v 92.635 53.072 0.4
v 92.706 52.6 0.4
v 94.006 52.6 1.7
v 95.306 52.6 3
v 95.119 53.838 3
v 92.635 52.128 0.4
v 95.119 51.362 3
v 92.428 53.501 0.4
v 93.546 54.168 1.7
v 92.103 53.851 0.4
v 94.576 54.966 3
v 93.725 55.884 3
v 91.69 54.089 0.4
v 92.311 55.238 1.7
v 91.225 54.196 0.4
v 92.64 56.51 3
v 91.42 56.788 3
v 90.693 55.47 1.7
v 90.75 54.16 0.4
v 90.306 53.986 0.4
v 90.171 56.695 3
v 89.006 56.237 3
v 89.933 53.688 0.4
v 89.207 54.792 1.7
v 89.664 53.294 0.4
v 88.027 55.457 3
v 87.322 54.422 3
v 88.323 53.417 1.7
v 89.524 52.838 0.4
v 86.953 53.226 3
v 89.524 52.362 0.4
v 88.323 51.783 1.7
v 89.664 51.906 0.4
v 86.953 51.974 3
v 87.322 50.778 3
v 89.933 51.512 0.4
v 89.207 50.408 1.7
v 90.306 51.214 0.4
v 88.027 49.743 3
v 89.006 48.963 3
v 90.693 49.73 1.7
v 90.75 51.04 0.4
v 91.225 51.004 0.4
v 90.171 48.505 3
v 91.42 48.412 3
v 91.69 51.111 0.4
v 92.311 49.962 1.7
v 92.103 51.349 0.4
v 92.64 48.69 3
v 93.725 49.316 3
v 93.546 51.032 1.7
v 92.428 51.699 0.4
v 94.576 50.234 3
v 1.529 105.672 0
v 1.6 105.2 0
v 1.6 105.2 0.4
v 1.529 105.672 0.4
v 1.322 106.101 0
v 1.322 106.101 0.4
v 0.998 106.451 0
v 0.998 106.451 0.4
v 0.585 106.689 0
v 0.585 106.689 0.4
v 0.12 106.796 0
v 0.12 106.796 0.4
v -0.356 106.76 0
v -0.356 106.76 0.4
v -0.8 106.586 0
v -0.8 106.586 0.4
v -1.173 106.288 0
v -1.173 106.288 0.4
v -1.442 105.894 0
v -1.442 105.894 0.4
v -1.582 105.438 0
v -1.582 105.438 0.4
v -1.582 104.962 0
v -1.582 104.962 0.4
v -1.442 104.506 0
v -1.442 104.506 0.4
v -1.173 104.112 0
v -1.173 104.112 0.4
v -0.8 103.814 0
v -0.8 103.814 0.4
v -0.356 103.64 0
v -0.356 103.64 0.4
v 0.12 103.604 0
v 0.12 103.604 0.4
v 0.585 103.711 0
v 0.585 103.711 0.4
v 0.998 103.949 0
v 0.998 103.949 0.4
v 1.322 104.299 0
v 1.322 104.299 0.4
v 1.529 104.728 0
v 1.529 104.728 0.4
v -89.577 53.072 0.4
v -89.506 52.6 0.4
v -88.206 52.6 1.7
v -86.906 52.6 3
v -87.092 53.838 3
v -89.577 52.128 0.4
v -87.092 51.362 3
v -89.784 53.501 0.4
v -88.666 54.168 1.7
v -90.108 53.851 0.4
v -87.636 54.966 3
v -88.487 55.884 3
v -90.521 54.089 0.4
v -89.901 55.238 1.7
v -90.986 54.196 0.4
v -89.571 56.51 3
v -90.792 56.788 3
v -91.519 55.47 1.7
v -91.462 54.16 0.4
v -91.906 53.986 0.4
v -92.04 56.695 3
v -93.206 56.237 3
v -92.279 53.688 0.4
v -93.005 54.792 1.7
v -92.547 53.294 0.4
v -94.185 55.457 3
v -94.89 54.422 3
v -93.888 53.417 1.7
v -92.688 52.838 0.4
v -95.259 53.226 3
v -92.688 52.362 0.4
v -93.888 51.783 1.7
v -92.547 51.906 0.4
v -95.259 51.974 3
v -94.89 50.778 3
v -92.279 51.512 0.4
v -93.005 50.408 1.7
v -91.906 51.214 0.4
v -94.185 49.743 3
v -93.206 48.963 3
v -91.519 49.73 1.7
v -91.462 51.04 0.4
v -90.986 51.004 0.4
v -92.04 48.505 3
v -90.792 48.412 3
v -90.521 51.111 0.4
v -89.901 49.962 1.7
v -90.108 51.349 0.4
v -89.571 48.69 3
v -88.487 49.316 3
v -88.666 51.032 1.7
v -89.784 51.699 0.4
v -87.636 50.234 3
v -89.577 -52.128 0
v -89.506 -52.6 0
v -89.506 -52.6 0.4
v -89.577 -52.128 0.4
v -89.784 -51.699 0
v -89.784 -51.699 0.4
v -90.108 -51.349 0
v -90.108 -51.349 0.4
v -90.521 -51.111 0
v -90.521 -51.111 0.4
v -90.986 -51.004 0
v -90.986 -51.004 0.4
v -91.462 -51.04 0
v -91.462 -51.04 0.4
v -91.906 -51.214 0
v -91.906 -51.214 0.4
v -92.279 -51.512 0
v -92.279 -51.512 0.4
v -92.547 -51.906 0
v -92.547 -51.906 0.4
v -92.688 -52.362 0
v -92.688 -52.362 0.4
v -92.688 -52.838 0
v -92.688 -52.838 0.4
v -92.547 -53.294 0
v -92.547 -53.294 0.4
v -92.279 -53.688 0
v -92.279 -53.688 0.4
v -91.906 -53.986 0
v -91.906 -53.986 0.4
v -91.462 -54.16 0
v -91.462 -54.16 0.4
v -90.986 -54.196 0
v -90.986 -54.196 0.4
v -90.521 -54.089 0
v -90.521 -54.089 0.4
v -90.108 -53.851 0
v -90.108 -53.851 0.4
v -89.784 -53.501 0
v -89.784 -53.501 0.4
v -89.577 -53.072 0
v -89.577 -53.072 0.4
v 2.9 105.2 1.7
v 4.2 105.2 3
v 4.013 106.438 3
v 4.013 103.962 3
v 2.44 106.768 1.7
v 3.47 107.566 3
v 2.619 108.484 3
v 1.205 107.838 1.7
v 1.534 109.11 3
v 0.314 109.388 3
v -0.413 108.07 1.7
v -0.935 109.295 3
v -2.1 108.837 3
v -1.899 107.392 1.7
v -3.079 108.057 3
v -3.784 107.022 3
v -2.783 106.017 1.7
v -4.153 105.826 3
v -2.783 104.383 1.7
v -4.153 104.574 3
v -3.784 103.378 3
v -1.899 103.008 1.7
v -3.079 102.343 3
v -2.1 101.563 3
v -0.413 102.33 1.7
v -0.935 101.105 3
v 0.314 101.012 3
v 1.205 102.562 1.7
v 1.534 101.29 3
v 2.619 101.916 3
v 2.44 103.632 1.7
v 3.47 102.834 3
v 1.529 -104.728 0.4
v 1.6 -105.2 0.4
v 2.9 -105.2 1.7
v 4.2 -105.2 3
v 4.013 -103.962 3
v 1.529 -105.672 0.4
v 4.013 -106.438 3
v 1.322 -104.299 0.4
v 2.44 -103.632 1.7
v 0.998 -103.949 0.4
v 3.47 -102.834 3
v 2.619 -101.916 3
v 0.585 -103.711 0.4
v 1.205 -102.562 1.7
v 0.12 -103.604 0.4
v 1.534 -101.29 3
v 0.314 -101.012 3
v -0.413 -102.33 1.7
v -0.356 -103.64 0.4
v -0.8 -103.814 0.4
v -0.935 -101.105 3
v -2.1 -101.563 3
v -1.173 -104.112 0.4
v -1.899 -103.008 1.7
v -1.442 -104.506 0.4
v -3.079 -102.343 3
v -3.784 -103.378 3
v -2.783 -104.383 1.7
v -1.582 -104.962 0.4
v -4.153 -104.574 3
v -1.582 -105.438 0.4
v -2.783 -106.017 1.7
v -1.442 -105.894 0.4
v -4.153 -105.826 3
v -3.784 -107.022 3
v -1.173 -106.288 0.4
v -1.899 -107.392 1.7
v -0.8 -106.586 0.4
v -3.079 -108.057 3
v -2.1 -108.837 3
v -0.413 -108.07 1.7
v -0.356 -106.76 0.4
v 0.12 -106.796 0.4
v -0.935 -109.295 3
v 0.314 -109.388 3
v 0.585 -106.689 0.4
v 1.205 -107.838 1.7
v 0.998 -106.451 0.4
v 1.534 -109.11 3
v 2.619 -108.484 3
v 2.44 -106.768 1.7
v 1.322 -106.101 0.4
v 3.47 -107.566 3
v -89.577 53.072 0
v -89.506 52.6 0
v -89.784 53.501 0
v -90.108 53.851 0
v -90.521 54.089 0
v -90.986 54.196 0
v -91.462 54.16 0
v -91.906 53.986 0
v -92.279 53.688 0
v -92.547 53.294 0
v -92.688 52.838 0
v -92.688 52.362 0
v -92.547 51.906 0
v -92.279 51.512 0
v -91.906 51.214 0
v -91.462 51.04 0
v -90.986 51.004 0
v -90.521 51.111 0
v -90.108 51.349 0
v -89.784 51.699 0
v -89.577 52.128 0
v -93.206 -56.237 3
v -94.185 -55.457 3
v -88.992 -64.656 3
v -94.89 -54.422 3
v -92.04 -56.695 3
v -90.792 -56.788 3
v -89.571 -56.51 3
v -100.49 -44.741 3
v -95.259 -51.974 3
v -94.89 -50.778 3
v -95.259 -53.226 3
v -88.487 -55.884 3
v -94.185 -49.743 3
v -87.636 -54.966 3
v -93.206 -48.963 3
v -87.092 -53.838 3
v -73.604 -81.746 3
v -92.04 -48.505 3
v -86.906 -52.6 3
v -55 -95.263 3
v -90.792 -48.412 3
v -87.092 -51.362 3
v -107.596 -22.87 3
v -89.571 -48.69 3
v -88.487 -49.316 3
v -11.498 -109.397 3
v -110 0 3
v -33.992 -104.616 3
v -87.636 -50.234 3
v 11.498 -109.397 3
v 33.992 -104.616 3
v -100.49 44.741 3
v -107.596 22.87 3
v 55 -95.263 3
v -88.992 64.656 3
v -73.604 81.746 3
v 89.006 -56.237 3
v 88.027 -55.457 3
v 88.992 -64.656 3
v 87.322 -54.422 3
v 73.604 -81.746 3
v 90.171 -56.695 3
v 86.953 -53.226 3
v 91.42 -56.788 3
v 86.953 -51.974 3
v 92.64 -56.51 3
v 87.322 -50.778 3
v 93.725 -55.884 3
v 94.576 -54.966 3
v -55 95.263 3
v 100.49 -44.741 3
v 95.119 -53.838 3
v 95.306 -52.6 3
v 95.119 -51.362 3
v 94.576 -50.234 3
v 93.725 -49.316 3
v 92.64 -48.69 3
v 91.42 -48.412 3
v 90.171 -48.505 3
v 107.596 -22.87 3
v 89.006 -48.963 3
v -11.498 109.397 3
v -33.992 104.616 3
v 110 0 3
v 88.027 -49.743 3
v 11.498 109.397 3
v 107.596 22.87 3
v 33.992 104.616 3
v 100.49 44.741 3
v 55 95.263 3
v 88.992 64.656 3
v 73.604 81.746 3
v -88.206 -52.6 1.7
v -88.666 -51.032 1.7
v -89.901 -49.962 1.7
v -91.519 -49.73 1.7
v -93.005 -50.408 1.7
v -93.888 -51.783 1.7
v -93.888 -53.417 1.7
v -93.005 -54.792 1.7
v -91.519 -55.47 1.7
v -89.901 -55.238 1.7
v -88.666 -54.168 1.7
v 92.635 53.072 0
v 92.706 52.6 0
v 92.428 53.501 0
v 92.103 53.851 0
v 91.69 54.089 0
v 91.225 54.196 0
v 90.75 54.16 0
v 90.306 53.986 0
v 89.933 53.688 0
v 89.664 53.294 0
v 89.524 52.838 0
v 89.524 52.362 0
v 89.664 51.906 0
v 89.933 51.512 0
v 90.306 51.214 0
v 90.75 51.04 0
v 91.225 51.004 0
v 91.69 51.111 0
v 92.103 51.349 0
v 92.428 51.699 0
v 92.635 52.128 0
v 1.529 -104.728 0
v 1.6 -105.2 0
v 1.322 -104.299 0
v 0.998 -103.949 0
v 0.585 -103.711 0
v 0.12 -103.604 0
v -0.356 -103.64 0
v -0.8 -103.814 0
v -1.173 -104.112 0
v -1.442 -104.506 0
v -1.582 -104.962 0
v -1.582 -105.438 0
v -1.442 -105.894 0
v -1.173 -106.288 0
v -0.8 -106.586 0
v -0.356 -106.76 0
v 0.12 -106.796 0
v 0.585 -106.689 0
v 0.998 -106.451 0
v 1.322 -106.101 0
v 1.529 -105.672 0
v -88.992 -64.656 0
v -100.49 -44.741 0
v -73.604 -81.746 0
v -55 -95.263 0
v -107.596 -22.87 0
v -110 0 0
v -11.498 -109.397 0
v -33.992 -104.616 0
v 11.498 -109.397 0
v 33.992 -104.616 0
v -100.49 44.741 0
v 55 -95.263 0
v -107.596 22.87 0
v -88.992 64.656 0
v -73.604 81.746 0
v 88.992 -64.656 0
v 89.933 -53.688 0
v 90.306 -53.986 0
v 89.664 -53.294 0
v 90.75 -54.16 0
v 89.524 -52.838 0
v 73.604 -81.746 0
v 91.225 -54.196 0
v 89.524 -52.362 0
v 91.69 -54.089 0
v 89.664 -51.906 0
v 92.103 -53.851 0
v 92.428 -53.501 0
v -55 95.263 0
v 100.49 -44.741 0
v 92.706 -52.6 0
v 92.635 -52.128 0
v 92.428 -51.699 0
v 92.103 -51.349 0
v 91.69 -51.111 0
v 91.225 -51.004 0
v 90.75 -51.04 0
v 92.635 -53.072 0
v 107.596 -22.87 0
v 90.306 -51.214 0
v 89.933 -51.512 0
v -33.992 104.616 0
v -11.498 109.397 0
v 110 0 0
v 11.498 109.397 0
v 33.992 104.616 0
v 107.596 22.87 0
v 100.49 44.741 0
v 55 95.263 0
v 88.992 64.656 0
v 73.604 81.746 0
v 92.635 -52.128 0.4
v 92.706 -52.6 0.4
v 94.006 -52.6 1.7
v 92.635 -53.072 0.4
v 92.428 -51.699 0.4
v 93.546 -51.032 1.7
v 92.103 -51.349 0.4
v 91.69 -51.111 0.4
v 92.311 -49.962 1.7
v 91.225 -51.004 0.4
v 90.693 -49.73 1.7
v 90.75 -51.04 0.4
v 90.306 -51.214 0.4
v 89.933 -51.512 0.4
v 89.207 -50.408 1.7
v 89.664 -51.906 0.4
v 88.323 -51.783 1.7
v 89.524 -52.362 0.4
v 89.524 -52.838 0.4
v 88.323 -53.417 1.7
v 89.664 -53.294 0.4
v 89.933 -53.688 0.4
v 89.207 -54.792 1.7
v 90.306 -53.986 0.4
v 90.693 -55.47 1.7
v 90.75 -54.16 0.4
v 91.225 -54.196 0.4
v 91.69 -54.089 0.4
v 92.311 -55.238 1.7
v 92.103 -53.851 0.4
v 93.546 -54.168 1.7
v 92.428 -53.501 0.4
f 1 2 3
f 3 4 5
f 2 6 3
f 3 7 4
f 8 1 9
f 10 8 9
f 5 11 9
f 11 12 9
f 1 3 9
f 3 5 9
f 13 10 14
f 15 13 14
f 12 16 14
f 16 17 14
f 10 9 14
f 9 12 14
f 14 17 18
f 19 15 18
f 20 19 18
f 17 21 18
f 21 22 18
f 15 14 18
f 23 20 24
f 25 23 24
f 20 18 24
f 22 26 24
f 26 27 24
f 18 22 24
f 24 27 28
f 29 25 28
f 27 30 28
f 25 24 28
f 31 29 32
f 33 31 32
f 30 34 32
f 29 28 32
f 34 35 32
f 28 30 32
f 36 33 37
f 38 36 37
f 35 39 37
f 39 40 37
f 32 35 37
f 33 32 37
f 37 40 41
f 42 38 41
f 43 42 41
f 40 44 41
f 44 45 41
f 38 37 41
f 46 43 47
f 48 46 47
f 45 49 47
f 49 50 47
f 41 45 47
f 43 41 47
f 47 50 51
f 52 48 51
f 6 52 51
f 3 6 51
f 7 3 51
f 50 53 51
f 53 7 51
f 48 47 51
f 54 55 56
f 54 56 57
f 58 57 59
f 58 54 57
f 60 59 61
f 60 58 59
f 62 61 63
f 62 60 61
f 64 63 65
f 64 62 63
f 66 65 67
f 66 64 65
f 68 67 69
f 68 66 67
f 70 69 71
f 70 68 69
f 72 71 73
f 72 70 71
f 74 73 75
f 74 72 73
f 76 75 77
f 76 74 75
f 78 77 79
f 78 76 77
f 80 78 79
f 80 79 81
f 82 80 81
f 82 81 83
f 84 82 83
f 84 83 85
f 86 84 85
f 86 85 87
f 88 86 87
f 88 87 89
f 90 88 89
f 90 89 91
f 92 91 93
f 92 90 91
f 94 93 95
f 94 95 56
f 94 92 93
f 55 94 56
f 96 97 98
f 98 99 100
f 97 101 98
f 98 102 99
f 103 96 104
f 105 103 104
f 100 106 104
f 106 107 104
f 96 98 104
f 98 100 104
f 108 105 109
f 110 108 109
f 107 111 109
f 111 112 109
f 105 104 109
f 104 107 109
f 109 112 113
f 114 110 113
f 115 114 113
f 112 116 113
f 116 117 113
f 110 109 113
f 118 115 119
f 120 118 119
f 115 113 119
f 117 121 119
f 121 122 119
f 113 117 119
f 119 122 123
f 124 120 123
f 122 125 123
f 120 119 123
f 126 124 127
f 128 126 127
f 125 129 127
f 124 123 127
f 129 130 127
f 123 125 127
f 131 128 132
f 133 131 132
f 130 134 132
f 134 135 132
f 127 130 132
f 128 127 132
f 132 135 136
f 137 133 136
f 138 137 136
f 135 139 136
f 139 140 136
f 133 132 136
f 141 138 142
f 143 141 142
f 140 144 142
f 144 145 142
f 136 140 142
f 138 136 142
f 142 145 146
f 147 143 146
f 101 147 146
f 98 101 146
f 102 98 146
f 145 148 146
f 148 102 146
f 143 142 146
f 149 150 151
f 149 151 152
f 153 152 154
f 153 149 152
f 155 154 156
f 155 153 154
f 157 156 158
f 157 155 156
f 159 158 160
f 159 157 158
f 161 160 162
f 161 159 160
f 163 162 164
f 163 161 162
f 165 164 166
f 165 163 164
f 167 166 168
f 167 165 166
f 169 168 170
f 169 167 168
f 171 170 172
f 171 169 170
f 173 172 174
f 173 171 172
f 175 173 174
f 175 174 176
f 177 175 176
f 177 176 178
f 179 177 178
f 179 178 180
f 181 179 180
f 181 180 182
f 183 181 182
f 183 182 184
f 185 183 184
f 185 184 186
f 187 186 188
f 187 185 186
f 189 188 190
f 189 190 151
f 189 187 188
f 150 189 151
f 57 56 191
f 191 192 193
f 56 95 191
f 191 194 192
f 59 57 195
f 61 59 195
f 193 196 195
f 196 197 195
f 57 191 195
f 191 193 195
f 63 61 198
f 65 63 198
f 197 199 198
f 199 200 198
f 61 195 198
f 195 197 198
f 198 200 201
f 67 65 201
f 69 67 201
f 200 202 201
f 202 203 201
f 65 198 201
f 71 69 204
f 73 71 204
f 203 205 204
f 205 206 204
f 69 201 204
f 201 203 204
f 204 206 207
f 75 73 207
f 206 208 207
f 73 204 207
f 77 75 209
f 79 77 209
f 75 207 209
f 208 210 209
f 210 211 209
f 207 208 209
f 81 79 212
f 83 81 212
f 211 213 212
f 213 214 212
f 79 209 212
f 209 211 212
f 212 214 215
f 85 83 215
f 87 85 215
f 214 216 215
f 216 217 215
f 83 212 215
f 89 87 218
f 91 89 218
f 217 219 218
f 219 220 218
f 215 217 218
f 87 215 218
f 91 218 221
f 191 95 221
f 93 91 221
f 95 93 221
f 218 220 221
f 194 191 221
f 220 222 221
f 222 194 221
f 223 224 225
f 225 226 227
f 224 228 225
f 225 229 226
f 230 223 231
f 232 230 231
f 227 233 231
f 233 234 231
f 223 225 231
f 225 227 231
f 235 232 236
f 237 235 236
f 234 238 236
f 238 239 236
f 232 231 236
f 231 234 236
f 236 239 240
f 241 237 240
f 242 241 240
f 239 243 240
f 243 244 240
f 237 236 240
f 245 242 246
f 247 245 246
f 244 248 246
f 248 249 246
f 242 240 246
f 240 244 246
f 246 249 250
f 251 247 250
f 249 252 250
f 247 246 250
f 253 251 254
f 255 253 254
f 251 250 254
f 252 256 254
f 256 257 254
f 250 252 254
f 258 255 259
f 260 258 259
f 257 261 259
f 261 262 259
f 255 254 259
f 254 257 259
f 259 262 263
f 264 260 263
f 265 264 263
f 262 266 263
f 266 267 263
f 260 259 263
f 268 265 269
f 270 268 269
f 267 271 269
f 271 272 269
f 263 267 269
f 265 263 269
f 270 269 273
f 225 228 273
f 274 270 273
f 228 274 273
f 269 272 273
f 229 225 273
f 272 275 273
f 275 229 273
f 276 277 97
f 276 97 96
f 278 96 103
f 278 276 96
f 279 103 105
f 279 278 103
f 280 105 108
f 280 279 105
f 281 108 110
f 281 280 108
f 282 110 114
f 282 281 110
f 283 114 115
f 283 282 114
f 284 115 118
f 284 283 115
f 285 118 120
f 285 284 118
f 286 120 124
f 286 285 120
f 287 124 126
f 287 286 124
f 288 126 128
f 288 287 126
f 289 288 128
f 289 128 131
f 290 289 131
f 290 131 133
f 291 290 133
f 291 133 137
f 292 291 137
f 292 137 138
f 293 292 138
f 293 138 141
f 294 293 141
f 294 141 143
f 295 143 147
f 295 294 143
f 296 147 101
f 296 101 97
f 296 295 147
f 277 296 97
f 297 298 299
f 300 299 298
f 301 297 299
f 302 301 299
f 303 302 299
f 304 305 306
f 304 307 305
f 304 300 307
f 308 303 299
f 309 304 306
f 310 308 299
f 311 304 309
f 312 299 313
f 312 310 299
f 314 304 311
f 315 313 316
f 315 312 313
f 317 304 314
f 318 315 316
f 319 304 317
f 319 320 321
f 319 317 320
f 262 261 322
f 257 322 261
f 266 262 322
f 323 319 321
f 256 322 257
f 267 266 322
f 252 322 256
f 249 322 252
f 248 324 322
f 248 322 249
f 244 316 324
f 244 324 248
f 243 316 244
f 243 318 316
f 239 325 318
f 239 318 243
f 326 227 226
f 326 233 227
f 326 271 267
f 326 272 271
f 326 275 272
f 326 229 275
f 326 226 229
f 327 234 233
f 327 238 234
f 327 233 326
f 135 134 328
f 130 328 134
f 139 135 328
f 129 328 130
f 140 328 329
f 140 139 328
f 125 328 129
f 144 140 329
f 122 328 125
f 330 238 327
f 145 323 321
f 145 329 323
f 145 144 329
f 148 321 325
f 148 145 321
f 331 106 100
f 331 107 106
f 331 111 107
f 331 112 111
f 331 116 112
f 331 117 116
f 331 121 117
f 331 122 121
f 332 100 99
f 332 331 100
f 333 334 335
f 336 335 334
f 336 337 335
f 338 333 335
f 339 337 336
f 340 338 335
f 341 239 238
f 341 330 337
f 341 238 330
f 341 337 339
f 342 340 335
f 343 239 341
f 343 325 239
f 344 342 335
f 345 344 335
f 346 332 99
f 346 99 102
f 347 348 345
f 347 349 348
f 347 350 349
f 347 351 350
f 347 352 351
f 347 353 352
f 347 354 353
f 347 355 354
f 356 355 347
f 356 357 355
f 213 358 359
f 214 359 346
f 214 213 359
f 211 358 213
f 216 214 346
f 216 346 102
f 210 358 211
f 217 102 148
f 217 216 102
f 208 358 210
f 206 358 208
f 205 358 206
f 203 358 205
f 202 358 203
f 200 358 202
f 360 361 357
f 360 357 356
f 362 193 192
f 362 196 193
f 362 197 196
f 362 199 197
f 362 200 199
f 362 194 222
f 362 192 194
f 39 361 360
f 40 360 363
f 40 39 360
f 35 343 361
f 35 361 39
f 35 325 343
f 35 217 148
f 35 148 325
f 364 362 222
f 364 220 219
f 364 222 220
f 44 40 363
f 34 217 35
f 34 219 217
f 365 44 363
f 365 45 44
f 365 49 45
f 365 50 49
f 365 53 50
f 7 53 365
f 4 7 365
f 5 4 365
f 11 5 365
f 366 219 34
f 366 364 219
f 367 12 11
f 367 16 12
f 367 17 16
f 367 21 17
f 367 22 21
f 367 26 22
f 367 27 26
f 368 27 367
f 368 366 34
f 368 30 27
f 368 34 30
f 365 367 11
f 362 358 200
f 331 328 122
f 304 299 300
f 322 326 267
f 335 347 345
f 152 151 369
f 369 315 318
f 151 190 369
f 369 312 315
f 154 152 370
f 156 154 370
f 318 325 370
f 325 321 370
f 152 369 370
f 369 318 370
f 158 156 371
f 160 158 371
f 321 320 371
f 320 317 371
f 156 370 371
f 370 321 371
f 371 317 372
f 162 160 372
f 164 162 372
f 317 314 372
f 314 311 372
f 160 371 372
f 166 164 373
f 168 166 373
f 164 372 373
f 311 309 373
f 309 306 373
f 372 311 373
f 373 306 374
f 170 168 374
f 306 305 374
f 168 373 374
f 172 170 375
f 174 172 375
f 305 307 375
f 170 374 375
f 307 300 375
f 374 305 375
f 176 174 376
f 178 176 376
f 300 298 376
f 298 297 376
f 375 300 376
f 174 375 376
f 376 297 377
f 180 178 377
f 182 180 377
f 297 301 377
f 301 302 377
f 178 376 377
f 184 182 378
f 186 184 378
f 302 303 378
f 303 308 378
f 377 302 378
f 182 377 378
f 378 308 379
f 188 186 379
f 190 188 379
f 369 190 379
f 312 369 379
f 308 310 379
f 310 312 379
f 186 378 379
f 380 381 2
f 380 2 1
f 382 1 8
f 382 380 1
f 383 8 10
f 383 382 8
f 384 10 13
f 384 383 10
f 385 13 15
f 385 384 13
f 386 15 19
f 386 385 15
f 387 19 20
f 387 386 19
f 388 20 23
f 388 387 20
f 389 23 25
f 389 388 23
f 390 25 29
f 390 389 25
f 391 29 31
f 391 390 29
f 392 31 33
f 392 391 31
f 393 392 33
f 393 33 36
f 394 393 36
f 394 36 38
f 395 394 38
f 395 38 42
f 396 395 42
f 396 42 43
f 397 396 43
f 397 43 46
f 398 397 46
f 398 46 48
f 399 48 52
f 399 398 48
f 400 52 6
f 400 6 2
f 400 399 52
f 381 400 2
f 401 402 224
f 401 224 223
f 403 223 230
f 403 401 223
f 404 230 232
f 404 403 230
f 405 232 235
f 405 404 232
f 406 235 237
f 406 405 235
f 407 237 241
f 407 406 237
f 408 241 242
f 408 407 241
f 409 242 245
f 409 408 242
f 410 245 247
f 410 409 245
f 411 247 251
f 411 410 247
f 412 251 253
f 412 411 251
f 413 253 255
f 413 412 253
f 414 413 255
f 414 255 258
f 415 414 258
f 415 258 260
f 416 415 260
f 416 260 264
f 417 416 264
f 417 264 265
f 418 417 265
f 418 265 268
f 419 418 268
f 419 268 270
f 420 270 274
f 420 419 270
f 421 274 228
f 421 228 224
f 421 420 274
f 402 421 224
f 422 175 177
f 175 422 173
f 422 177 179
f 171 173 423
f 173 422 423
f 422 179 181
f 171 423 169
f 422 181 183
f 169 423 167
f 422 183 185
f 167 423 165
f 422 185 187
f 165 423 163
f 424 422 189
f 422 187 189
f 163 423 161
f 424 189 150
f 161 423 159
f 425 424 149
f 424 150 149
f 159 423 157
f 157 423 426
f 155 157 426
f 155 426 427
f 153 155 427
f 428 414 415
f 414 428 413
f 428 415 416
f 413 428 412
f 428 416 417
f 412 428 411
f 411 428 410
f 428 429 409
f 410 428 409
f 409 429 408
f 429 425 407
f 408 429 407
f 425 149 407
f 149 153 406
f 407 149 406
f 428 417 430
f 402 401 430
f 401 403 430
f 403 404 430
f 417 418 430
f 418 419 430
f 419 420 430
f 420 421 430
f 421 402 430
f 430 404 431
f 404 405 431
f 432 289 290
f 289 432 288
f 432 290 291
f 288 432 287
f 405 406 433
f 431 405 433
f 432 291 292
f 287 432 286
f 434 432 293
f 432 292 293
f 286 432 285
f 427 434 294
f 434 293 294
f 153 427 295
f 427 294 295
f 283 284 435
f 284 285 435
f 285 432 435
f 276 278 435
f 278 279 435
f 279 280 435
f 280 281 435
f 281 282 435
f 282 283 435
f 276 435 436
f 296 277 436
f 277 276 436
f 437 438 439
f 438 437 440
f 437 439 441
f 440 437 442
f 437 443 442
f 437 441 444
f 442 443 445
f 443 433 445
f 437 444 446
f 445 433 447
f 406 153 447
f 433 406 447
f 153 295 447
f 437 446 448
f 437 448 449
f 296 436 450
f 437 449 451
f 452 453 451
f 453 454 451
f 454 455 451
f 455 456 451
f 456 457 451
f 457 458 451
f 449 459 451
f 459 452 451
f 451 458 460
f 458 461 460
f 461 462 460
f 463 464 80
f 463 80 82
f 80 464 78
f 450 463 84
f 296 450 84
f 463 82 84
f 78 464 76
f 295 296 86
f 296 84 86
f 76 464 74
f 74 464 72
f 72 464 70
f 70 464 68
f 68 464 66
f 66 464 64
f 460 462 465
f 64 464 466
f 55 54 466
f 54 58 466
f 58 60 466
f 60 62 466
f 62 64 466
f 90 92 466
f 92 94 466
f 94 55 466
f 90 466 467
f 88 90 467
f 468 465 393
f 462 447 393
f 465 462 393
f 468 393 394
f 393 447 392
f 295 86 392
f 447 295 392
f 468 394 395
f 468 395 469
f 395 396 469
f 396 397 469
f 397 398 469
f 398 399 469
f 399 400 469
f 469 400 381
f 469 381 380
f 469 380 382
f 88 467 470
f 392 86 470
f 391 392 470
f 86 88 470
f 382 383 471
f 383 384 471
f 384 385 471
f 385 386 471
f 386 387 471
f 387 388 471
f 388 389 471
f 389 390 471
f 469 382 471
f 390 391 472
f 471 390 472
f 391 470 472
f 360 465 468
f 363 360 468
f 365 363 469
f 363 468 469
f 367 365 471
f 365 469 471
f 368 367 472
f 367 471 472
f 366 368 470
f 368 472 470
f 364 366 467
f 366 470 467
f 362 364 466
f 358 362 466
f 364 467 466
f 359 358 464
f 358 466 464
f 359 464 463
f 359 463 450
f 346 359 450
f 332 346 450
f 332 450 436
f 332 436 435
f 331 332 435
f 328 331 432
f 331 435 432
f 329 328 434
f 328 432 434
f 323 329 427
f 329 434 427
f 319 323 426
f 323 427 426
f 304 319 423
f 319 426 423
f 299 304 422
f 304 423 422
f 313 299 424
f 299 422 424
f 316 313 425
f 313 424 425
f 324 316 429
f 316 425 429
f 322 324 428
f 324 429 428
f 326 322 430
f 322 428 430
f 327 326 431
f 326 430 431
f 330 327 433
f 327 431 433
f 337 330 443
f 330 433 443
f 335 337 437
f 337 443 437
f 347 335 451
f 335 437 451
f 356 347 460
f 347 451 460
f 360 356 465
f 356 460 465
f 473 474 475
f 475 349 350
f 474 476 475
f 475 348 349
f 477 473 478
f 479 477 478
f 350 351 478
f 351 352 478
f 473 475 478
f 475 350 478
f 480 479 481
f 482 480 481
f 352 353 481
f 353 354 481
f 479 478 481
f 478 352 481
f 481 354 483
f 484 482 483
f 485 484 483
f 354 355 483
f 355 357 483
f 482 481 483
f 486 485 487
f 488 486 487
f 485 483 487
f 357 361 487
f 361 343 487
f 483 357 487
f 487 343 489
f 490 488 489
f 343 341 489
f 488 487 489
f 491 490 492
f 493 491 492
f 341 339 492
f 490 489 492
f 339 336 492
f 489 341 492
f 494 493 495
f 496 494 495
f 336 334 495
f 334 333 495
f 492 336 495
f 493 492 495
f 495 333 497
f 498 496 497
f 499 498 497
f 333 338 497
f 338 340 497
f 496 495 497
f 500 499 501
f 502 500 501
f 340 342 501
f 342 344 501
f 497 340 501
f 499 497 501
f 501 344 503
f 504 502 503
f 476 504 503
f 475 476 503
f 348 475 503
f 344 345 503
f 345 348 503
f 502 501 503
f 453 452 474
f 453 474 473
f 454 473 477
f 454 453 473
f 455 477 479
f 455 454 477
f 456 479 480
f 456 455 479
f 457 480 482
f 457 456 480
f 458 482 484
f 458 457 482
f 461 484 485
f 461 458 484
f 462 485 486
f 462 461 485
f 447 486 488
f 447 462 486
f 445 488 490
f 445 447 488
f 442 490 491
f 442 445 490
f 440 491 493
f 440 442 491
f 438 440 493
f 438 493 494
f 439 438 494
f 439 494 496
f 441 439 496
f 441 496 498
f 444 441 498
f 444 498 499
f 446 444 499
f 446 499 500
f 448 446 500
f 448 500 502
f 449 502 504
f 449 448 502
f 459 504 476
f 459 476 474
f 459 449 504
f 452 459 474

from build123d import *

# Parameters (mm, degrees)
F0_R     = 110
F0_R_2   = 1.6
F1_DEPTH = 3
F2_SIZE  = 2.6


with BuildPart() as f1:
    # F0 (on Top) → F1 (new body)
    with BuildSketch(Plane.XY):
        Circle(F0_R)
        with Locations((-91.105872, -52.6)):
            Circle(F0_R_2, mode=Mode.SUBTRACT)
        with Locations((0, -105.2)):
            Circle(F0_R_2, mode=Mode.SUBTRACT)
        with Locations((91.105872, -52.6)):
            Circle(F0_R_2, mode=Mode.SUBTRACT)
        with Locations((-91.105872, 52.6)):
            Circle(F0_R_2, mode=Mode.SUBTRACT)
        with Locations((91.105872, 52.6)):
            Circle(F0_R_2, mode=Mode.SUBTRACT)
        with Locations((0, 105.2)):
            Circle(F0_R_2, mode=Mode.SUBTRACT)
    extrude(amount=F1_DEPTH)

    # F2
    f2_edges = [f1.edges().sort_by_distance(p)[0] for p in [
        (-92.705872, 52.6, 3),
        (-1.6, 105.2, 3),
        (89.505872, 52.6, 3),
        (89.505872, -52.6, 3),
        (-1.6, -105.2, 3),
        (-92.705872, -52.6, 3),
    ]]
    chamfer(f2_edges, length=F2_SIZE)


solid = f1.part
